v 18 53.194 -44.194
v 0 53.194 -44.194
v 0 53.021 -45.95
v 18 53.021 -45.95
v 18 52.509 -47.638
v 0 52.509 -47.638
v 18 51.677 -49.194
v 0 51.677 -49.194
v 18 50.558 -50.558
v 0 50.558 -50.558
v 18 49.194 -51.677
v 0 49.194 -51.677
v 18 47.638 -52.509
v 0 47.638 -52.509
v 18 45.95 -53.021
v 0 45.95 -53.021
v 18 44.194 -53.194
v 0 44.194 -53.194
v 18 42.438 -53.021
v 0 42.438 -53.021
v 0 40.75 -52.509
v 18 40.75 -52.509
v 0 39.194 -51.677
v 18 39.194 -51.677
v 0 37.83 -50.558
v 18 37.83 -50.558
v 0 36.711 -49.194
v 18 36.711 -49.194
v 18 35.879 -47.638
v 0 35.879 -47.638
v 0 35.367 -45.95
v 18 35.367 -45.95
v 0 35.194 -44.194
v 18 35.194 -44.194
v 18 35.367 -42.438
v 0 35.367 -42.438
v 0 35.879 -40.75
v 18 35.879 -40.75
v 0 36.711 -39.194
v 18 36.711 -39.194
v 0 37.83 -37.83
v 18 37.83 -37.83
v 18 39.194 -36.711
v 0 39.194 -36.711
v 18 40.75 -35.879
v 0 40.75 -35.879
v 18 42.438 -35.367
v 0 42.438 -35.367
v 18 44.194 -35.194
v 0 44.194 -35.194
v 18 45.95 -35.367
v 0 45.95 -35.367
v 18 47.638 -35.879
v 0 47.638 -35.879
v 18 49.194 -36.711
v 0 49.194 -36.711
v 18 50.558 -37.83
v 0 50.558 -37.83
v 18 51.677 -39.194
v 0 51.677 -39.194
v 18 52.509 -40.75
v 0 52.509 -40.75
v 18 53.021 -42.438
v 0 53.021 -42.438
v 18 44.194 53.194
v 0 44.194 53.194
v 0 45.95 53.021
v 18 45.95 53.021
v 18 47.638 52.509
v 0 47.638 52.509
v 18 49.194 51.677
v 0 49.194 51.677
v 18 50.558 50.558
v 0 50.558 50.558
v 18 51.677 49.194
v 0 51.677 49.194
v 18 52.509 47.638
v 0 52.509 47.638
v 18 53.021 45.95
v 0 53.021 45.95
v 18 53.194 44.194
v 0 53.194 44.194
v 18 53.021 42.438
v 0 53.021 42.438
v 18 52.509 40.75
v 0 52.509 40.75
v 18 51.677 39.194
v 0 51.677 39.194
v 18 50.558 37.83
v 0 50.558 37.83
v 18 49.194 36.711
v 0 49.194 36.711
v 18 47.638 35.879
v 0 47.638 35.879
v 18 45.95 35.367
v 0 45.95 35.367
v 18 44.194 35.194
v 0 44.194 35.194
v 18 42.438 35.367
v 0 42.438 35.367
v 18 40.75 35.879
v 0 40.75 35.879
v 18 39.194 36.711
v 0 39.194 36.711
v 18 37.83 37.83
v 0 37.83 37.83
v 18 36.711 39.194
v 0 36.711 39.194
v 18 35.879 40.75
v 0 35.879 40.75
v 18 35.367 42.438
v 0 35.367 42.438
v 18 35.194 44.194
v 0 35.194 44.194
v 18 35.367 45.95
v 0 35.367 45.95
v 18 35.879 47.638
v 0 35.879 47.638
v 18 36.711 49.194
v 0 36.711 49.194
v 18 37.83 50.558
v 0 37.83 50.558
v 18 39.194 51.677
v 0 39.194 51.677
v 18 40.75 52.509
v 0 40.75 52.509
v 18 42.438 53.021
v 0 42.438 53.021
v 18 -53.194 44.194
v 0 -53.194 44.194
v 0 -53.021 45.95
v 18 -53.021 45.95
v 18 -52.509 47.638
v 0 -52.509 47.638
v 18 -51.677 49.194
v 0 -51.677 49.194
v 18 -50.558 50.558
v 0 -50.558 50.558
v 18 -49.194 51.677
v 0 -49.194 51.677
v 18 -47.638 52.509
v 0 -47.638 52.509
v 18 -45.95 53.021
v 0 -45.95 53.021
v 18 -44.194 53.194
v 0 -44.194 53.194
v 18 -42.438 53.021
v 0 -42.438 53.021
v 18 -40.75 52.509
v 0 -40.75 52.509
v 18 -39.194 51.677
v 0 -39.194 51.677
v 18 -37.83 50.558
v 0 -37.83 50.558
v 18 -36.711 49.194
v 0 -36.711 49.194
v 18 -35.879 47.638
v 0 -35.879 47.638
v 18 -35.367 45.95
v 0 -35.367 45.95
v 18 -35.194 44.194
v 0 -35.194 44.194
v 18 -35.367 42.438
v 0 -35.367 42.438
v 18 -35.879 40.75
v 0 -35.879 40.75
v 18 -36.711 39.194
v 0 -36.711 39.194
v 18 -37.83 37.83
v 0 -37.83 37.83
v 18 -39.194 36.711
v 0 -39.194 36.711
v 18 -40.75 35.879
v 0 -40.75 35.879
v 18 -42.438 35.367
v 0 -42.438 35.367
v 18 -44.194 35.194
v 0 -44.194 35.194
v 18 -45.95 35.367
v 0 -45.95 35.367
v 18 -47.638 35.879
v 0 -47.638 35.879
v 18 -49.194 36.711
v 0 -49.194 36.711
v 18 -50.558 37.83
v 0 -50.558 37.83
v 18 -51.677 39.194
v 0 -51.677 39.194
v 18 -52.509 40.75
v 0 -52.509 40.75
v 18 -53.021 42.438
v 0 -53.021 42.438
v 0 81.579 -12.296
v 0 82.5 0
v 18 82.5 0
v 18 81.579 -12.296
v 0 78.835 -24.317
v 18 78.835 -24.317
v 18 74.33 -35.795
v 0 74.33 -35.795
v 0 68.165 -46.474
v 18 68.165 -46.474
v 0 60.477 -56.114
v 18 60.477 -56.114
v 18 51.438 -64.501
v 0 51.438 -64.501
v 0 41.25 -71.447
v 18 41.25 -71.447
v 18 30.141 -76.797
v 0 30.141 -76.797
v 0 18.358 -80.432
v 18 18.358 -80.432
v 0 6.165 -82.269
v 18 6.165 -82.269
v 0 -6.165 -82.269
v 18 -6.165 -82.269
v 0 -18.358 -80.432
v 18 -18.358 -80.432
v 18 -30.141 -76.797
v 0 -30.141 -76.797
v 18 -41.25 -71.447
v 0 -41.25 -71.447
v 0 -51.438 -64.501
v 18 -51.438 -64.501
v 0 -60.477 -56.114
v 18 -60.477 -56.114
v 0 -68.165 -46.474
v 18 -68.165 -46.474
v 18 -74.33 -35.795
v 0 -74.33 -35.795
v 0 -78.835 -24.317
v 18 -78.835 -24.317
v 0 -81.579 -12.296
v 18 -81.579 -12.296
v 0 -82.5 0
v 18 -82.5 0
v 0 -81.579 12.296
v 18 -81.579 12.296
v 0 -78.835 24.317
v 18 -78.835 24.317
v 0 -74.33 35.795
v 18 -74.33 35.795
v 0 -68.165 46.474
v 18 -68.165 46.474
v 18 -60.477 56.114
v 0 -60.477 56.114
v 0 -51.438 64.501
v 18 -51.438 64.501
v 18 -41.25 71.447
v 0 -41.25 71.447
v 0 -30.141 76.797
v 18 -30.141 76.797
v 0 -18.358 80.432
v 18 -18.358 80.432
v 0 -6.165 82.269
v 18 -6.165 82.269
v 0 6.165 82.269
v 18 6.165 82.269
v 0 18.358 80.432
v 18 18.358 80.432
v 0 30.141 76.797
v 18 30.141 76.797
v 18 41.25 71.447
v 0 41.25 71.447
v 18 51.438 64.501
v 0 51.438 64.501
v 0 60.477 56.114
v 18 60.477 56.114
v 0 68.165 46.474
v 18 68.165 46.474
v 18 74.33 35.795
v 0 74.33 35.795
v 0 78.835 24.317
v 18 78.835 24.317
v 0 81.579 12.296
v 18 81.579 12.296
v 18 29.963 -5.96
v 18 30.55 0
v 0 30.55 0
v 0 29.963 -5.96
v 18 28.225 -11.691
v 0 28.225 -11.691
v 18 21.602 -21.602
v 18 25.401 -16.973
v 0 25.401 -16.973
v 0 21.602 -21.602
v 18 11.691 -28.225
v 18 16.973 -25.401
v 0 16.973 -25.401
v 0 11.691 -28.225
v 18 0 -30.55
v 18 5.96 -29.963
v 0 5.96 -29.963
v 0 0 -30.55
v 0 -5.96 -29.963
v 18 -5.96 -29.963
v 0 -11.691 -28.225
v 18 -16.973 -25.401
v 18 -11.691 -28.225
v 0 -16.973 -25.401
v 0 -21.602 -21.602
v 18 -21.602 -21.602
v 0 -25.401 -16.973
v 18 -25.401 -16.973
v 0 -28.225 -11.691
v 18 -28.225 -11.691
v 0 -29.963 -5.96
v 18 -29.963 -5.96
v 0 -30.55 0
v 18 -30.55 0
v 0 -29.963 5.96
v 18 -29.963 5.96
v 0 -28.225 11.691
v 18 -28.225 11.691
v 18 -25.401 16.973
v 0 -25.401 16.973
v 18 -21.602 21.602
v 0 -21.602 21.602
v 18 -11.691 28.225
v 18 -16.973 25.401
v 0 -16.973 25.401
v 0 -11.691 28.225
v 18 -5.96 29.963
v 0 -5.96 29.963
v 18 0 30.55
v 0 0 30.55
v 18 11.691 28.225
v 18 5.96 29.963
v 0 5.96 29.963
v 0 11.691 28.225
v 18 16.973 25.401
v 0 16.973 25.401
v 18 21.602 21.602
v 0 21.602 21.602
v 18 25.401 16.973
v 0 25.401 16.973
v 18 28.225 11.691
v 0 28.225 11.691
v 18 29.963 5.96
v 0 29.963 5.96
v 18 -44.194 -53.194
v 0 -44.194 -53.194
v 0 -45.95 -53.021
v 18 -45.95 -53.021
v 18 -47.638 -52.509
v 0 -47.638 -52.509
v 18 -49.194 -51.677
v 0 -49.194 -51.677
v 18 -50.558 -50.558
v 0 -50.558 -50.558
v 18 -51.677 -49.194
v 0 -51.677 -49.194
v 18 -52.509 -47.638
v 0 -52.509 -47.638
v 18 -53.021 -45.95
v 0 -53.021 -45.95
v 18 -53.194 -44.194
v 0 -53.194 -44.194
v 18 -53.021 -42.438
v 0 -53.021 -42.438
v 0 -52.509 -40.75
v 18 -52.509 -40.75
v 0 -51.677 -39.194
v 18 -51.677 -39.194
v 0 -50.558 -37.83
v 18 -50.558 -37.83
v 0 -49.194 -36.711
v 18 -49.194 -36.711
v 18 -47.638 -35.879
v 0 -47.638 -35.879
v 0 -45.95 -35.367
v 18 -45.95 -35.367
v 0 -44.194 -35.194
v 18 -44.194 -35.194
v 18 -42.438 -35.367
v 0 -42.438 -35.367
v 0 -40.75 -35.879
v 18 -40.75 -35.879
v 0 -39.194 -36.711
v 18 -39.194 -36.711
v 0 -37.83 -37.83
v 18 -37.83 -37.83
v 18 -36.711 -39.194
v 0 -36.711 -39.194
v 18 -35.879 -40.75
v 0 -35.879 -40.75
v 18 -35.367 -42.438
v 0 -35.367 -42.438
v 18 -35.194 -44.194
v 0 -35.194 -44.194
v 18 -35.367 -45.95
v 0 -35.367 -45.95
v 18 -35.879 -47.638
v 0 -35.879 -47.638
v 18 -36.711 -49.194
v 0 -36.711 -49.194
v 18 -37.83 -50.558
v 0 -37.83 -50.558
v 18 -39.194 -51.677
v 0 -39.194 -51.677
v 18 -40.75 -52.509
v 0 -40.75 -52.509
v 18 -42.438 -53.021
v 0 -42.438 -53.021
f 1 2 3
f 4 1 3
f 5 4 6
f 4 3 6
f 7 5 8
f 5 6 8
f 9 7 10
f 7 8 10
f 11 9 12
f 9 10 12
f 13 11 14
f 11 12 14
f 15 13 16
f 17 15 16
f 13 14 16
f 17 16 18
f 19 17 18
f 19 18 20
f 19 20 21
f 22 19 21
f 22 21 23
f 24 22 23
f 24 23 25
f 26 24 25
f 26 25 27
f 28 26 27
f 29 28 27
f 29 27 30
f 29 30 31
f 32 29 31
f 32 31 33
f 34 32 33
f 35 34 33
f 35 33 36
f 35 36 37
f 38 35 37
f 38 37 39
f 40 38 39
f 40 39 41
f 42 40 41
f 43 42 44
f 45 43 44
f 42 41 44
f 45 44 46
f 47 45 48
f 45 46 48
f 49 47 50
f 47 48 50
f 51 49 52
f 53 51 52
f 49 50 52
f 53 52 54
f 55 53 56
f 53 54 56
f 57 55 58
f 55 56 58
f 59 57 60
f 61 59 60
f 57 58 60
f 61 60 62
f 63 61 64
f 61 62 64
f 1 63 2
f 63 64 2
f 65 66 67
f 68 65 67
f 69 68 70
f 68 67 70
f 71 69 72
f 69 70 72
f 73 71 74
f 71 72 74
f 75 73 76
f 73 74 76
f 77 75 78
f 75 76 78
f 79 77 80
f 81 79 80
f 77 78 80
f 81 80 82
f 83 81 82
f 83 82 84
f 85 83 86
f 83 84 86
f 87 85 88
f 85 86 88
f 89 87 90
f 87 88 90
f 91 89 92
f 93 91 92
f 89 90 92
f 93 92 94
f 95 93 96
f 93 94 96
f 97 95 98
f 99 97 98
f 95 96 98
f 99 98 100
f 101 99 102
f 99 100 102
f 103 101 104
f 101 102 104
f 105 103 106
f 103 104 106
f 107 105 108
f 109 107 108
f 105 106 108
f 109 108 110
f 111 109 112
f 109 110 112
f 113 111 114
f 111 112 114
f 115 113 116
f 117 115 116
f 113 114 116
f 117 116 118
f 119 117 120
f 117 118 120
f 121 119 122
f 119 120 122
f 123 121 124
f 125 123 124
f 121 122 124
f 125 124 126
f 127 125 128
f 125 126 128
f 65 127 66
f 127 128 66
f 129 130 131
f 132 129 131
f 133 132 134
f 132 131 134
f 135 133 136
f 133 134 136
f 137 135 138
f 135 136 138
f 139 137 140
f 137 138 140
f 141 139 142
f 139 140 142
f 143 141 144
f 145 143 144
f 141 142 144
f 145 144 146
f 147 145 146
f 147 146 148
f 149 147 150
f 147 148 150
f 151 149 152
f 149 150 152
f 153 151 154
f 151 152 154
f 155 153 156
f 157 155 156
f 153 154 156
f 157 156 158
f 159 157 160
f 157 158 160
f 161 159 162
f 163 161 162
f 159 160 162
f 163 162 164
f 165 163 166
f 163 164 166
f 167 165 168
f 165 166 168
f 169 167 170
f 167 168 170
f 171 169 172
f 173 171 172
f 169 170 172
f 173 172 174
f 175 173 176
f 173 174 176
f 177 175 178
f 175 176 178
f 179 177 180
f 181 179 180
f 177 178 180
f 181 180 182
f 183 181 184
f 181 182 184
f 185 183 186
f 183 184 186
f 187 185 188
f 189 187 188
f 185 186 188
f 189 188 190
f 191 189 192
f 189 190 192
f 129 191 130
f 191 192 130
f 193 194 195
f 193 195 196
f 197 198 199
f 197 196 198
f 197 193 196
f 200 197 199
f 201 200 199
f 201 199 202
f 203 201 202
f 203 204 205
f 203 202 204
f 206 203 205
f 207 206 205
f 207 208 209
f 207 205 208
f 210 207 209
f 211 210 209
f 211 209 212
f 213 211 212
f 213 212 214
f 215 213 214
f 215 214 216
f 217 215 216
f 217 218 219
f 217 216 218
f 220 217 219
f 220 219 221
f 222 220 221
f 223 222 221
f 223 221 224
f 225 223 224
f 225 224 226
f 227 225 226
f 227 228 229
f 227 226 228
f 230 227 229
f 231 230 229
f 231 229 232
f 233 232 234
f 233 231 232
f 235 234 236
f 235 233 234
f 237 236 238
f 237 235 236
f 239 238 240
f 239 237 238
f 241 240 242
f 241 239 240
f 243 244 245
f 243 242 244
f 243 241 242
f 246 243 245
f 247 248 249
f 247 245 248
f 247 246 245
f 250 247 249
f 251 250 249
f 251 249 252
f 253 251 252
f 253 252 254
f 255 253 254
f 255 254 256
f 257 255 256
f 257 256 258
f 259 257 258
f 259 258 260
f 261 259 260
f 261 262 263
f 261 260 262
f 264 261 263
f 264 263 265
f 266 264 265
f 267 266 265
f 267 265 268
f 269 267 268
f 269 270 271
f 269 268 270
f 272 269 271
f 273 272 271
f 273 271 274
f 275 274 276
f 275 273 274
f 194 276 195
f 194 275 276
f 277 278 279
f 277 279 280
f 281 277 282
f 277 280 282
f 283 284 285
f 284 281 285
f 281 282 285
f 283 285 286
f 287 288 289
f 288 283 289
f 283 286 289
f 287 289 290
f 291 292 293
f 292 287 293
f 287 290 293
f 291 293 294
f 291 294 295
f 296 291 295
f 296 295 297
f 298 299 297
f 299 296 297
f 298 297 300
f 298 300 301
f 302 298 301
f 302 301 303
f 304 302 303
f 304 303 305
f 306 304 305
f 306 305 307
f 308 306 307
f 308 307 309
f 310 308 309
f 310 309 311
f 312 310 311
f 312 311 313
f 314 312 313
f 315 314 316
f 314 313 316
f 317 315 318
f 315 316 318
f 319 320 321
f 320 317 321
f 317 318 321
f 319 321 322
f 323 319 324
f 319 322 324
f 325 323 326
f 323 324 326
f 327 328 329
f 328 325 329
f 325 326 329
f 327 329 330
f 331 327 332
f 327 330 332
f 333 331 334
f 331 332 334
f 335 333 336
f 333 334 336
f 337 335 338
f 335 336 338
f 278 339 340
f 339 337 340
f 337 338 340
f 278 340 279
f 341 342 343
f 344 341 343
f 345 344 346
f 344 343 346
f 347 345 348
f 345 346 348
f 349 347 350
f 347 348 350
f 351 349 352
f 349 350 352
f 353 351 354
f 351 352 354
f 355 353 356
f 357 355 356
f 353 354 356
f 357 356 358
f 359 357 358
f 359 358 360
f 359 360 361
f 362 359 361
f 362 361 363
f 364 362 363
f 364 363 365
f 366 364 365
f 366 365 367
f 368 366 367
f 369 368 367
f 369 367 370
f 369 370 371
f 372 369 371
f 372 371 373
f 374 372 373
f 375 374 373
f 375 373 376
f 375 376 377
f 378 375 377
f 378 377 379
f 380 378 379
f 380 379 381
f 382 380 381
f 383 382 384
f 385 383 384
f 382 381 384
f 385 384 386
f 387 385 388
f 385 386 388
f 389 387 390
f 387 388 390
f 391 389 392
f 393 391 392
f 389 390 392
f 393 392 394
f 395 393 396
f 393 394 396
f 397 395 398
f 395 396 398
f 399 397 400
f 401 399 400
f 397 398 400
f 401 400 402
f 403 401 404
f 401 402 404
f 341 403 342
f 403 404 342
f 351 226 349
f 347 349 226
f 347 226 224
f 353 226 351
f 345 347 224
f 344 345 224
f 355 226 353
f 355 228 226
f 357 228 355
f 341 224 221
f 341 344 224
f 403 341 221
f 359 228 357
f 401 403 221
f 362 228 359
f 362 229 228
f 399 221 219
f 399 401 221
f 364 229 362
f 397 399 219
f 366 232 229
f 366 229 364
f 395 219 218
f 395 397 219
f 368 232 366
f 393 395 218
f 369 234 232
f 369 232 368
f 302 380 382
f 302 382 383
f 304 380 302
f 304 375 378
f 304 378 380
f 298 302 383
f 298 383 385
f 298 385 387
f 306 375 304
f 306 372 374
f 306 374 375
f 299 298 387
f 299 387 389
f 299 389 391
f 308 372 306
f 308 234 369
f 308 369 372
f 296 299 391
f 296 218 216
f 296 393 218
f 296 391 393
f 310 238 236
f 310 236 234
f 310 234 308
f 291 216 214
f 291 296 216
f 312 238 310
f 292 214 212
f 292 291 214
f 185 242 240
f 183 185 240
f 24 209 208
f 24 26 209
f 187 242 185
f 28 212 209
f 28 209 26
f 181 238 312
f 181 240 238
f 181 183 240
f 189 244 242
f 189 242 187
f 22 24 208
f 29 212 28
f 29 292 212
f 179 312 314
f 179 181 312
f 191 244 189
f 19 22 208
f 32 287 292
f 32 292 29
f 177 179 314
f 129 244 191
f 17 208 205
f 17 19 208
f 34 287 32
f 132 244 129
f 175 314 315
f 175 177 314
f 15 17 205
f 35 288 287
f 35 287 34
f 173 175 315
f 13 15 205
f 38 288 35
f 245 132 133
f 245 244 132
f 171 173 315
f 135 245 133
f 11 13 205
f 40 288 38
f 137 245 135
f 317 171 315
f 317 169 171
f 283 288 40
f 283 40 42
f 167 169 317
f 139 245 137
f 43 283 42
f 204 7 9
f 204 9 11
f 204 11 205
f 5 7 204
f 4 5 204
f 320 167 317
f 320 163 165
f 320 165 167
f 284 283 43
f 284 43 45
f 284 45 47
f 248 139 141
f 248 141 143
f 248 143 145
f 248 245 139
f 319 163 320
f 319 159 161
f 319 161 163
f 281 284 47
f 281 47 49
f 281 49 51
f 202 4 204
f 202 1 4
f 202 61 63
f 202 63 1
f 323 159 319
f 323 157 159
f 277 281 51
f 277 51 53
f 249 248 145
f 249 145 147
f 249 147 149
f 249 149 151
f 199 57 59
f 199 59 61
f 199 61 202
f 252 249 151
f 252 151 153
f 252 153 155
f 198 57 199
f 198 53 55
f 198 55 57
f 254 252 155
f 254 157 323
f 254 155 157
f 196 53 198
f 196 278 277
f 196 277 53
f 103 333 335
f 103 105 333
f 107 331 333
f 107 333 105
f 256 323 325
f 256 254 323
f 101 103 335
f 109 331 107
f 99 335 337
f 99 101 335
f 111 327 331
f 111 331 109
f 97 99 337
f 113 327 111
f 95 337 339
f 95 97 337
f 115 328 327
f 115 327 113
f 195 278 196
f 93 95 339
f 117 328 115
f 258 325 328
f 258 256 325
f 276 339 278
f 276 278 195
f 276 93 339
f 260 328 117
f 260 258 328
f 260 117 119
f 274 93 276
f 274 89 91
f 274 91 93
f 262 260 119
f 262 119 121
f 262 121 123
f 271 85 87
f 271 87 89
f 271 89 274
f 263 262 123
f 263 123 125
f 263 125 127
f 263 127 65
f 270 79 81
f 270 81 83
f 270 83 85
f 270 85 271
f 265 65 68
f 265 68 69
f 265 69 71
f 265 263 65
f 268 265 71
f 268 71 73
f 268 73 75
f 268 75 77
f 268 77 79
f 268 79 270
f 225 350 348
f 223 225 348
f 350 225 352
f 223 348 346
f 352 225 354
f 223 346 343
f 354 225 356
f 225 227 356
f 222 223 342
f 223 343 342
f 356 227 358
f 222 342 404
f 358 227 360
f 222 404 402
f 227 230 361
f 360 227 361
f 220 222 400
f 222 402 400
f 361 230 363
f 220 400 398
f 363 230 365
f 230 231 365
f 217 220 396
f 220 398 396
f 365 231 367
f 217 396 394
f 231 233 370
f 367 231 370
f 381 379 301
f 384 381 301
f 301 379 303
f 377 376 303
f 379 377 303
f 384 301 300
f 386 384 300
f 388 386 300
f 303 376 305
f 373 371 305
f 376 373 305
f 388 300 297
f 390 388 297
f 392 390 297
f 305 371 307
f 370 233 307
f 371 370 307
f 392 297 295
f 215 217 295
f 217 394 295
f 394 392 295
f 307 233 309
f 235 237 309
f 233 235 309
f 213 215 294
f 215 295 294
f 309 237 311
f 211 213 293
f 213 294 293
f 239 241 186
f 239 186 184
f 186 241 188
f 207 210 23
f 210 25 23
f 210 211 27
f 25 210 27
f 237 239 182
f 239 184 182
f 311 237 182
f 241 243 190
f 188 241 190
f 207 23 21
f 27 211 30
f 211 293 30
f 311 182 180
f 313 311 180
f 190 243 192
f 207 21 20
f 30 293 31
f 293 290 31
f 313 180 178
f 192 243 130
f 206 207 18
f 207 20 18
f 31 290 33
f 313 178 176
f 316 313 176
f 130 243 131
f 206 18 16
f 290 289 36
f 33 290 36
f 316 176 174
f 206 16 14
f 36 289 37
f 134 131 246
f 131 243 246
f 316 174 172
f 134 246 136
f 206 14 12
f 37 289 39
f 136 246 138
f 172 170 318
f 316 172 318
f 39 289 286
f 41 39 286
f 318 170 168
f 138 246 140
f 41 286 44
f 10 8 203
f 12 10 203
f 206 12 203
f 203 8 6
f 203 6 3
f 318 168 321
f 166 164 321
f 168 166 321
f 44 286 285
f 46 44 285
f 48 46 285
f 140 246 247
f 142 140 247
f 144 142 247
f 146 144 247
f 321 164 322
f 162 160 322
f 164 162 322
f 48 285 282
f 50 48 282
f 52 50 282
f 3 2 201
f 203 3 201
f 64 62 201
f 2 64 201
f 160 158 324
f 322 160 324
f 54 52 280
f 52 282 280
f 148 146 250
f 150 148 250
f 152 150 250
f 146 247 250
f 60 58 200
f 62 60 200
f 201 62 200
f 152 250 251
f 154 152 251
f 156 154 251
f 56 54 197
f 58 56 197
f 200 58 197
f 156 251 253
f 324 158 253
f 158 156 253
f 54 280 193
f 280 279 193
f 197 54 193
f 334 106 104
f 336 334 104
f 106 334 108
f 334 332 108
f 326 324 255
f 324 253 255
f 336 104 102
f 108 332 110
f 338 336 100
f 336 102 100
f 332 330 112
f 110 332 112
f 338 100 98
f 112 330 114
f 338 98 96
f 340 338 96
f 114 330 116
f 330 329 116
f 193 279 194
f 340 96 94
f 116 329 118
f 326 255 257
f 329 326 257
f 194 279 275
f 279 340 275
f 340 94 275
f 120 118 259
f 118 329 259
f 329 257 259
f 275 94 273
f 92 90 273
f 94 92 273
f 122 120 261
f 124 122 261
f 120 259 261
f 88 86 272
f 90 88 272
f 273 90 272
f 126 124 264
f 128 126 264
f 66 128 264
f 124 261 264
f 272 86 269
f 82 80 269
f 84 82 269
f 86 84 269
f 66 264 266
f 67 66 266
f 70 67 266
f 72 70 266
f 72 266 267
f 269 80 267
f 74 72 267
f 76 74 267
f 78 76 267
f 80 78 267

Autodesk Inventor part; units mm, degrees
ref_plane "YZ Plane" through (0, 0, 0) normal (1, 0, 0) x (0, 1, 0)
ref_plane "XZ Plane" through (0, 0, 0) normal (0, 1, 0) x (-1, 0, 0)
ref_plane "XY Plane" through (0, 0, 0) normal (0, 0, 1) x (1, 0, 0)
sketch "Sketch1" plane through (0, 0, 0) normal (0, 0, 1) x (1, 0, 0)
  line L0 (18, 82.5) -> (0, 82.5)
  line L1 (0, 82.5) -> (0, 30.55)
  line L2 (0, 30.55) -> (0, 0) construction
  line L3 (0, 0) -> (18, 0) construction
  line L4 (18, 82.5) -> (18, 30.55)
  line L5 (18, 30.55) -> (0, 30.55)
  line L6 (18, 30.55) -> (18, 0) construction
  dimension "d0" = 165
  dimension "d1" = 18
  dimension "d5" = 61.1
revolve "Revolution1" add sketch "Sketch1" angle 360 about axis through (0, 0, 0) along (1, 0, 0)
sketch "Sketch2" plane through (0, 0, 0) normal (-1, 0, 0) x (0, 0, 1)
  circle A0 centre (0, 0) radius 30.55 projected
  line L0 (0, 62.5) -> (0, 0) construction
  circle A1 centre (0, 0) radius 82.5 projected
  circle A2 centre (0, 0) radius 62.5 construction
  line L1 (0, 0) -> (44.1942, 44.1942) construction
  circle A3 centre (44.1942, 44.1942) radius 9
  dimension "d6" = 18
  dimension "d7" = 62.5
  dimension "d8" = 45
extrude "Extrusion1" cut sketch "Sketch2" against normal through all contours A3
pattern_circular "Circular Pattern1" count 4 over 360 about axis through (9, 0, 0) along (1, 0, 0) of "Extrusion1"
equation "\"d6\" = dd2"
equation "\"d7\" = 0.5 * k"
equation "\"d0\" = D"
equation "\"d1\" = b"
equation "\"d5\" = dd5"
equation "\"b\" = 18"
equation "\"D\" = 165"
equation "\"k\" = 125"
equation "\"dd2\" = 18"
equation "\"dd5\" = 61.1"
equation "\"Size_Designation\" = 1.2345"
properties part number "DIN 2576 Slip-On Flange for Welding Series 1 (ISO) - PN 10 50 x 60.3" material "Steel"
